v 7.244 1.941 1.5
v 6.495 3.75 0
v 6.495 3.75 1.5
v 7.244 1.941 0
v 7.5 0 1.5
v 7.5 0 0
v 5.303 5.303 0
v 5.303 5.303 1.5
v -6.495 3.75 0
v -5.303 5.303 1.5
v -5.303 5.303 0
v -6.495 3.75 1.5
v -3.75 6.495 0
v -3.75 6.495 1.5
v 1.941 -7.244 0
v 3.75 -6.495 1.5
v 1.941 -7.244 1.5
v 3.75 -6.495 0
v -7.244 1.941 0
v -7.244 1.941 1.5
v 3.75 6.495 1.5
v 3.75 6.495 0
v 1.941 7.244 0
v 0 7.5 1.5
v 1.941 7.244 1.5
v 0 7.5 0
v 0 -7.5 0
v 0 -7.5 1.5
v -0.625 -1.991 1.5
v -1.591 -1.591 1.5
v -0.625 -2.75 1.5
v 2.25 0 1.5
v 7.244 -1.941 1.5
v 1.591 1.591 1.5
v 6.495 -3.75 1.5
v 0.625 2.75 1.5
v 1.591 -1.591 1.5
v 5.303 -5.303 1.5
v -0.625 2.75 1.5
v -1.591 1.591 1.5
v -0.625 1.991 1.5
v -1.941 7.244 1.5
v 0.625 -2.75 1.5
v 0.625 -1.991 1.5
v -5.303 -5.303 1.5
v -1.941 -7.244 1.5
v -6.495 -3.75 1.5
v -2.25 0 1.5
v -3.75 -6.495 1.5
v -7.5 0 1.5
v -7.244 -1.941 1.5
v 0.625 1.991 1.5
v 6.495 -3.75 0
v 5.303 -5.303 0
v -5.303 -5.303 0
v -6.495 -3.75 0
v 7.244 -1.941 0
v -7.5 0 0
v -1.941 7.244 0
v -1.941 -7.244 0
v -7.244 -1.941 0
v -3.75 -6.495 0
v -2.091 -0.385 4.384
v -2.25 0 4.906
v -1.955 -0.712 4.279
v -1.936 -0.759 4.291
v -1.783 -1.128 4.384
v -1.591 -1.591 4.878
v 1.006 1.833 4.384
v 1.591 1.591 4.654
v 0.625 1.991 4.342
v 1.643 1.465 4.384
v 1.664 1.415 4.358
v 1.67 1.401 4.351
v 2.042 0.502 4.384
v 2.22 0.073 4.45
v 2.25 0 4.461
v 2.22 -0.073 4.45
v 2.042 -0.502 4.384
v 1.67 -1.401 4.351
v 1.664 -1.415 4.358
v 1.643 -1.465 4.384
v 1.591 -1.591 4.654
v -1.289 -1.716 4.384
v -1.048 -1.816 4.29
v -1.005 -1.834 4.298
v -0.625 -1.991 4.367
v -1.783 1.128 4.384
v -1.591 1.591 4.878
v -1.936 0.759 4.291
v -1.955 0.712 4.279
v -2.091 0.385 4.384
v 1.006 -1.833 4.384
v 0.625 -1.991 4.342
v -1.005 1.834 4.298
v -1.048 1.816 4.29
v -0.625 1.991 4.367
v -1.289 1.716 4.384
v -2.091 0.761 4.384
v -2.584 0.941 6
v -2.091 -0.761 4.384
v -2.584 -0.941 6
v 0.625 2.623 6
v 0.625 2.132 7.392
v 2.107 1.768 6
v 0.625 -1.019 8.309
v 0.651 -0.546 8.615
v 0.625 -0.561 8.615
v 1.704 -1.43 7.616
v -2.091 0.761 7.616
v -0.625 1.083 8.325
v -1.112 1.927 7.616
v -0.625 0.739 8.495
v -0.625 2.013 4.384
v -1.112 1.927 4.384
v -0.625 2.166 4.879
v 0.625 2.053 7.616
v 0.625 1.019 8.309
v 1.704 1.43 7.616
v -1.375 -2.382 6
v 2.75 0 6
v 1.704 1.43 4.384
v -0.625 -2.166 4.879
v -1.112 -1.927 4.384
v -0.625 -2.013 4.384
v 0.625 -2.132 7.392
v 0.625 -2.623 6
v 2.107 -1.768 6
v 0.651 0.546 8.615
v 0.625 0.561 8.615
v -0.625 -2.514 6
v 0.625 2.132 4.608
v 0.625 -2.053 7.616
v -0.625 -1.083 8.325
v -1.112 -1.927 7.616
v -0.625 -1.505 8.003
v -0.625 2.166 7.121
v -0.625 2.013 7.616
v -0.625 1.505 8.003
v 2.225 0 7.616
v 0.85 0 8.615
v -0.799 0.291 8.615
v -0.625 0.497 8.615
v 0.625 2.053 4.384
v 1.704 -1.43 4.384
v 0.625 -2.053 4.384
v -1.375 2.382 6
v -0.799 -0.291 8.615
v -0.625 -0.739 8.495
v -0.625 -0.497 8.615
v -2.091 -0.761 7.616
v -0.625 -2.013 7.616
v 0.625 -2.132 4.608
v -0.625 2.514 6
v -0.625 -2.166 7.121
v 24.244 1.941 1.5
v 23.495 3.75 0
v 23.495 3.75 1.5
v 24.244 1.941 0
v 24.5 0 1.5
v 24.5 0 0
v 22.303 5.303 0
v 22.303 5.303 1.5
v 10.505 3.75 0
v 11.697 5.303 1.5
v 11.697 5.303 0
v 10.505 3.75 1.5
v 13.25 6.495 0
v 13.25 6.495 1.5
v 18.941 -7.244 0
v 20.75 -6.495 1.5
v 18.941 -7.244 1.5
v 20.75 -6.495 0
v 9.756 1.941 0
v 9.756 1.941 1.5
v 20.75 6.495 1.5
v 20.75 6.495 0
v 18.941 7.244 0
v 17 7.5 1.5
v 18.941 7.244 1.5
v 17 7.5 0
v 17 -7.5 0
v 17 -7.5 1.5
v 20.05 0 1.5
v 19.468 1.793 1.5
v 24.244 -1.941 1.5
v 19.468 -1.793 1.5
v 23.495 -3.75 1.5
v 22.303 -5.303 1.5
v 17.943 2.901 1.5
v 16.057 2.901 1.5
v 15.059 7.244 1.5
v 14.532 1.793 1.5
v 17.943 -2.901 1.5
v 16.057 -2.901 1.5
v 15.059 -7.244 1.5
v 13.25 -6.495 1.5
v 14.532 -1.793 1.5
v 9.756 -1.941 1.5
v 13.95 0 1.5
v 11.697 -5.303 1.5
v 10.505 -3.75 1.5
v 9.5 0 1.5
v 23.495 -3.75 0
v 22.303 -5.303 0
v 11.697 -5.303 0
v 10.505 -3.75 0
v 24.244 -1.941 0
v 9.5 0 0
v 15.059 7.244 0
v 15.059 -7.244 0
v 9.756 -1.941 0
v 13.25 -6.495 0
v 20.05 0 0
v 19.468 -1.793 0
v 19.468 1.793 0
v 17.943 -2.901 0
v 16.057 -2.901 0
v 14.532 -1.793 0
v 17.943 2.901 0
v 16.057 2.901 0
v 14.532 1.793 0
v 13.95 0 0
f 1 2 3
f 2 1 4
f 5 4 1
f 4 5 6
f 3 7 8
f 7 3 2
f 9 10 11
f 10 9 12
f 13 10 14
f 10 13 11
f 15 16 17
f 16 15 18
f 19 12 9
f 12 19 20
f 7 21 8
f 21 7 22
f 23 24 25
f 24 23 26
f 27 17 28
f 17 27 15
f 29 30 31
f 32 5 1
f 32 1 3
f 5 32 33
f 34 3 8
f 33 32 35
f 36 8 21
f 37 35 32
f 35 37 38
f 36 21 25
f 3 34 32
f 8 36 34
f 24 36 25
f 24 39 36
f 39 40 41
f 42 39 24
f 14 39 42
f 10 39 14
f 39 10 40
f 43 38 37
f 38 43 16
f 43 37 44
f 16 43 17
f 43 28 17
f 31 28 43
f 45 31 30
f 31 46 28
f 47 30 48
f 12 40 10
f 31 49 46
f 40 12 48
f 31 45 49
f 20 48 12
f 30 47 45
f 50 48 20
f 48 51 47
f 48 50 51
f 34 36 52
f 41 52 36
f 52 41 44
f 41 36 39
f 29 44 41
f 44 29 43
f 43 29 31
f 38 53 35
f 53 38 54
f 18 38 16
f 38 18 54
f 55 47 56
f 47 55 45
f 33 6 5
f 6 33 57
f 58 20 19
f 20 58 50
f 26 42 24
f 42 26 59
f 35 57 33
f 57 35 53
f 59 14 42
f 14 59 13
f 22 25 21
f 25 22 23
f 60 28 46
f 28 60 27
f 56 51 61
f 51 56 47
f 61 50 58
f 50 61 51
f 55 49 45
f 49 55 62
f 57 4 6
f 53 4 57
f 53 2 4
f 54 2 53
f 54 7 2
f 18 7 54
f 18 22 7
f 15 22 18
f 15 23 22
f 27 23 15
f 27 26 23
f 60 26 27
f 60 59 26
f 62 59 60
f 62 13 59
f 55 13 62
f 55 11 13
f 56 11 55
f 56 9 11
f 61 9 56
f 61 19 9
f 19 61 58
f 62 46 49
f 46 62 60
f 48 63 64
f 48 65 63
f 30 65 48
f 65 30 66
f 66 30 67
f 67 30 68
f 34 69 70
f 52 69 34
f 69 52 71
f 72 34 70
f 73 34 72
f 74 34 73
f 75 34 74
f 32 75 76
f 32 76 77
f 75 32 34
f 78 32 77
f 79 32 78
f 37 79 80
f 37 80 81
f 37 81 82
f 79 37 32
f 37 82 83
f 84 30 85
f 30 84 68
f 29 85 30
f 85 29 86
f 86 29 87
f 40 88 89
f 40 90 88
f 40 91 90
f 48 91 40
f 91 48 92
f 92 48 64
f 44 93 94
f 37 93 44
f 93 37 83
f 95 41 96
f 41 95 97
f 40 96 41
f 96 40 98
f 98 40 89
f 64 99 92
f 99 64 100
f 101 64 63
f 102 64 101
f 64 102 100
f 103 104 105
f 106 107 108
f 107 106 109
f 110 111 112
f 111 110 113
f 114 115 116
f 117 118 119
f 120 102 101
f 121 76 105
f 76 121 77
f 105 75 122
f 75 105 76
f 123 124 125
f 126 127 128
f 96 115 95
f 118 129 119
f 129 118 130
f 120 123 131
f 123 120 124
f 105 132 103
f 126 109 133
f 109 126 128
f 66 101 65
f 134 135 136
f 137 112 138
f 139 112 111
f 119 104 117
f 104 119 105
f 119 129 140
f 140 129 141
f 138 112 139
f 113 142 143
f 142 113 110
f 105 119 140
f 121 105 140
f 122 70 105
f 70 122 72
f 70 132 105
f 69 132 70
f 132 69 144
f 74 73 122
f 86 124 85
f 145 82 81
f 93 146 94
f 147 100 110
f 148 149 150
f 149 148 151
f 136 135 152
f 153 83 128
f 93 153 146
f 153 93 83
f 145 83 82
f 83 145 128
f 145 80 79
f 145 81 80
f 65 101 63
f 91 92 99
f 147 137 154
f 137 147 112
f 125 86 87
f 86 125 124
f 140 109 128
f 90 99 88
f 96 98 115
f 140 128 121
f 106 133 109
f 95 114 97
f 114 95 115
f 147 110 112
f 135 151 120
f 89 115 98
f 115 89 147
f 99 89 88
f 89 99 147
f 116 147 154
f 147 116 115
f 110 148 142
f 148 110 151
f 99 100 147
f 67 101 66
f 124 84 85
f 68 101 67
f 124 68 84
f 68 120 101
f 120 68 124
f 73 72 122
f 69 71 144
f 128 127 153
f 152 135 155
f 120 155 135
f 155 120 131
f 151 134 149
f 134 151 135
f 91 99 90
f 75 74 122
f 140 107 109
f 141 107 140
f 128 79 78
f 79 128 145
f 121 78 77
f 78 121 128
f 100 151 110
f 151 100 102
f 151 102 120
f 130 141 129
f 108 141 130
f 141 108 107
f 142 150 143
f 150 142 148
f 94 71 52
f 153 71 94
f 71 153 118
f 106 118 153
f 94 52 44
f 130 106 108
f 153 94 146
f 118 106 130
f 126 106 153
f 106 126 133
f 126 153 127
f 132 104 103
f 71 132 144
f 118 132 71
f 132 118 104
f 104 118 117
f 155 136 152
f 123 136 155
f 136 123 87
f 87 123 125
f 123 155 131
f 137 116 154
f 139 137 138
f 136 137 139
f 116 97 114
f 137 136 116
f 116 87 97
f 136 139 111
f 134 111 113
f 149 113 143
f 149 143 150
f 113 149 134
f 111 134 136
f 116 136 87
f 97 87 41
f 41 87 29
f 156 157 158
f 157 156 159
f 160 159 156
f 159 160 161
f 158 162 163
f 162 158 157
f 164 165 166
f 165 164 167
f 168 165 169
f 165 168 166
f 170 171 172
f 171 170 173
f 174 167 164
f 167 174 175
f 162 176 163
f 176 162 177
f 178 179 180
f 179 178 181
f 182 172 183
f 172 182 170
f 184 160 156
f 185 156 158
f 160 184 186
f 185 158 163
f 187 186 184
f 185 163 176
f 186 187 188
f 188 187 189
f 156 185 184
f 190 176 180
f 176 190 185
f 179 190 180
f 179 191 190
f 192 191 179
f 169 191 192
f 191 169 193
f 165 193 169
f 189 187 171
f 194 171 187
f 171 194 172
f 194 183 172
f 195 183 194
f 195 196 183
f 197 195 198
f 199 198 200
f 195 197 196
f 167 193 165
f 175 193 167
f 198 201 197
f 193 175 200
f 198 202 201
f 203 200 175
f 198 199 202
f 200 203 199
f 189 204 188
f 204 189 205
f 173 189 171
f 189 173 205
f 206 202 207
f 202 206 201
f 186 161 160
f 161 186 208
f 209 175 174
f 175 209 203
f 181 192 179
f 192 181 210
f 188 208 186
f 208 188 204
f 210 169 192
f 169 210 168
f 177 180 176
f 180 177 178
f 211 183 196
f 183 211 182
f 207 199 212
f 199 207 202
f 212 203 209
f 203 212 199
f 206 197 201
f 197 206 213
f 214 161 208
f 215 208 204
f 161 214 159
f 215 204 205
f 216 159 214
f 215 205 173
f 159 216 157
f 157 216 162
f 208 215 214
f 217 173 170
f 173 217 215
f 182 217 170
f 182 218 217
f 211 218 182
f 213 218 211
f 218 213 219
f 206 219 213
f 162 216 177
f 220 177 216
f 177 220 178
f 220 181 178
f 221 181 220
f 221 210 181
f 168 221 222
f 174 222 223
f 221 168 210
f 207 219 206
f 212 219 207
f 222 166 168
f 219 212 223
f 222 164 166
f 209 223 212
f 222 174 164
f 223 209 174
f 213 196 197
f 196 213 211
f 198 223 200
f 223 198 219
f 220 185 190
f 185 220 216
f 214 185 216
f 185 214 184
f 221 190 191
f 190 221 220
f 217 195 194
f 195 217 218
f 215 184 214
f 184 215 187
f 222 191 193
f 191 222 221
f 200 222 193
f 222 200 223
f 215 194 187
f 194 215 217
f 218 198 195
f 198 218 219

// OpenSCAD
//fastner radius
lR = 7.5;
//hole radius
iR = 2.25;
//fastner height of tags
h = 1.5;
//paper width
pW = 3;
//increment of stopper to fasten
dH=1;

module fastnerPeg(){
difference(){
 union(){
	cylinder(r=lR,h=h);
	translate([0,0,h]) cylinder(r=iR,h=pW+h);
	translate([0,0,2*h+pW]) sphere(r=iR+dH/2);
	}
	translate([-(dH*1.25)/2,-(iR*2+dH)/2,h]) cube([dH*1.25,iR*2+dH,h+pW+iR+dH/2]) ;
}
}

module fastnerWasher(){
	difference(){
		cylinder(r=lR,h=h);
		// increase r if your printer prints smaller holes.
		cylinder(r=iR+dH/2+0.3,h=h);
	}
}

fastnerPeg();

translate([lR *2 + 2,0,0]) 
fastnerWasher();
